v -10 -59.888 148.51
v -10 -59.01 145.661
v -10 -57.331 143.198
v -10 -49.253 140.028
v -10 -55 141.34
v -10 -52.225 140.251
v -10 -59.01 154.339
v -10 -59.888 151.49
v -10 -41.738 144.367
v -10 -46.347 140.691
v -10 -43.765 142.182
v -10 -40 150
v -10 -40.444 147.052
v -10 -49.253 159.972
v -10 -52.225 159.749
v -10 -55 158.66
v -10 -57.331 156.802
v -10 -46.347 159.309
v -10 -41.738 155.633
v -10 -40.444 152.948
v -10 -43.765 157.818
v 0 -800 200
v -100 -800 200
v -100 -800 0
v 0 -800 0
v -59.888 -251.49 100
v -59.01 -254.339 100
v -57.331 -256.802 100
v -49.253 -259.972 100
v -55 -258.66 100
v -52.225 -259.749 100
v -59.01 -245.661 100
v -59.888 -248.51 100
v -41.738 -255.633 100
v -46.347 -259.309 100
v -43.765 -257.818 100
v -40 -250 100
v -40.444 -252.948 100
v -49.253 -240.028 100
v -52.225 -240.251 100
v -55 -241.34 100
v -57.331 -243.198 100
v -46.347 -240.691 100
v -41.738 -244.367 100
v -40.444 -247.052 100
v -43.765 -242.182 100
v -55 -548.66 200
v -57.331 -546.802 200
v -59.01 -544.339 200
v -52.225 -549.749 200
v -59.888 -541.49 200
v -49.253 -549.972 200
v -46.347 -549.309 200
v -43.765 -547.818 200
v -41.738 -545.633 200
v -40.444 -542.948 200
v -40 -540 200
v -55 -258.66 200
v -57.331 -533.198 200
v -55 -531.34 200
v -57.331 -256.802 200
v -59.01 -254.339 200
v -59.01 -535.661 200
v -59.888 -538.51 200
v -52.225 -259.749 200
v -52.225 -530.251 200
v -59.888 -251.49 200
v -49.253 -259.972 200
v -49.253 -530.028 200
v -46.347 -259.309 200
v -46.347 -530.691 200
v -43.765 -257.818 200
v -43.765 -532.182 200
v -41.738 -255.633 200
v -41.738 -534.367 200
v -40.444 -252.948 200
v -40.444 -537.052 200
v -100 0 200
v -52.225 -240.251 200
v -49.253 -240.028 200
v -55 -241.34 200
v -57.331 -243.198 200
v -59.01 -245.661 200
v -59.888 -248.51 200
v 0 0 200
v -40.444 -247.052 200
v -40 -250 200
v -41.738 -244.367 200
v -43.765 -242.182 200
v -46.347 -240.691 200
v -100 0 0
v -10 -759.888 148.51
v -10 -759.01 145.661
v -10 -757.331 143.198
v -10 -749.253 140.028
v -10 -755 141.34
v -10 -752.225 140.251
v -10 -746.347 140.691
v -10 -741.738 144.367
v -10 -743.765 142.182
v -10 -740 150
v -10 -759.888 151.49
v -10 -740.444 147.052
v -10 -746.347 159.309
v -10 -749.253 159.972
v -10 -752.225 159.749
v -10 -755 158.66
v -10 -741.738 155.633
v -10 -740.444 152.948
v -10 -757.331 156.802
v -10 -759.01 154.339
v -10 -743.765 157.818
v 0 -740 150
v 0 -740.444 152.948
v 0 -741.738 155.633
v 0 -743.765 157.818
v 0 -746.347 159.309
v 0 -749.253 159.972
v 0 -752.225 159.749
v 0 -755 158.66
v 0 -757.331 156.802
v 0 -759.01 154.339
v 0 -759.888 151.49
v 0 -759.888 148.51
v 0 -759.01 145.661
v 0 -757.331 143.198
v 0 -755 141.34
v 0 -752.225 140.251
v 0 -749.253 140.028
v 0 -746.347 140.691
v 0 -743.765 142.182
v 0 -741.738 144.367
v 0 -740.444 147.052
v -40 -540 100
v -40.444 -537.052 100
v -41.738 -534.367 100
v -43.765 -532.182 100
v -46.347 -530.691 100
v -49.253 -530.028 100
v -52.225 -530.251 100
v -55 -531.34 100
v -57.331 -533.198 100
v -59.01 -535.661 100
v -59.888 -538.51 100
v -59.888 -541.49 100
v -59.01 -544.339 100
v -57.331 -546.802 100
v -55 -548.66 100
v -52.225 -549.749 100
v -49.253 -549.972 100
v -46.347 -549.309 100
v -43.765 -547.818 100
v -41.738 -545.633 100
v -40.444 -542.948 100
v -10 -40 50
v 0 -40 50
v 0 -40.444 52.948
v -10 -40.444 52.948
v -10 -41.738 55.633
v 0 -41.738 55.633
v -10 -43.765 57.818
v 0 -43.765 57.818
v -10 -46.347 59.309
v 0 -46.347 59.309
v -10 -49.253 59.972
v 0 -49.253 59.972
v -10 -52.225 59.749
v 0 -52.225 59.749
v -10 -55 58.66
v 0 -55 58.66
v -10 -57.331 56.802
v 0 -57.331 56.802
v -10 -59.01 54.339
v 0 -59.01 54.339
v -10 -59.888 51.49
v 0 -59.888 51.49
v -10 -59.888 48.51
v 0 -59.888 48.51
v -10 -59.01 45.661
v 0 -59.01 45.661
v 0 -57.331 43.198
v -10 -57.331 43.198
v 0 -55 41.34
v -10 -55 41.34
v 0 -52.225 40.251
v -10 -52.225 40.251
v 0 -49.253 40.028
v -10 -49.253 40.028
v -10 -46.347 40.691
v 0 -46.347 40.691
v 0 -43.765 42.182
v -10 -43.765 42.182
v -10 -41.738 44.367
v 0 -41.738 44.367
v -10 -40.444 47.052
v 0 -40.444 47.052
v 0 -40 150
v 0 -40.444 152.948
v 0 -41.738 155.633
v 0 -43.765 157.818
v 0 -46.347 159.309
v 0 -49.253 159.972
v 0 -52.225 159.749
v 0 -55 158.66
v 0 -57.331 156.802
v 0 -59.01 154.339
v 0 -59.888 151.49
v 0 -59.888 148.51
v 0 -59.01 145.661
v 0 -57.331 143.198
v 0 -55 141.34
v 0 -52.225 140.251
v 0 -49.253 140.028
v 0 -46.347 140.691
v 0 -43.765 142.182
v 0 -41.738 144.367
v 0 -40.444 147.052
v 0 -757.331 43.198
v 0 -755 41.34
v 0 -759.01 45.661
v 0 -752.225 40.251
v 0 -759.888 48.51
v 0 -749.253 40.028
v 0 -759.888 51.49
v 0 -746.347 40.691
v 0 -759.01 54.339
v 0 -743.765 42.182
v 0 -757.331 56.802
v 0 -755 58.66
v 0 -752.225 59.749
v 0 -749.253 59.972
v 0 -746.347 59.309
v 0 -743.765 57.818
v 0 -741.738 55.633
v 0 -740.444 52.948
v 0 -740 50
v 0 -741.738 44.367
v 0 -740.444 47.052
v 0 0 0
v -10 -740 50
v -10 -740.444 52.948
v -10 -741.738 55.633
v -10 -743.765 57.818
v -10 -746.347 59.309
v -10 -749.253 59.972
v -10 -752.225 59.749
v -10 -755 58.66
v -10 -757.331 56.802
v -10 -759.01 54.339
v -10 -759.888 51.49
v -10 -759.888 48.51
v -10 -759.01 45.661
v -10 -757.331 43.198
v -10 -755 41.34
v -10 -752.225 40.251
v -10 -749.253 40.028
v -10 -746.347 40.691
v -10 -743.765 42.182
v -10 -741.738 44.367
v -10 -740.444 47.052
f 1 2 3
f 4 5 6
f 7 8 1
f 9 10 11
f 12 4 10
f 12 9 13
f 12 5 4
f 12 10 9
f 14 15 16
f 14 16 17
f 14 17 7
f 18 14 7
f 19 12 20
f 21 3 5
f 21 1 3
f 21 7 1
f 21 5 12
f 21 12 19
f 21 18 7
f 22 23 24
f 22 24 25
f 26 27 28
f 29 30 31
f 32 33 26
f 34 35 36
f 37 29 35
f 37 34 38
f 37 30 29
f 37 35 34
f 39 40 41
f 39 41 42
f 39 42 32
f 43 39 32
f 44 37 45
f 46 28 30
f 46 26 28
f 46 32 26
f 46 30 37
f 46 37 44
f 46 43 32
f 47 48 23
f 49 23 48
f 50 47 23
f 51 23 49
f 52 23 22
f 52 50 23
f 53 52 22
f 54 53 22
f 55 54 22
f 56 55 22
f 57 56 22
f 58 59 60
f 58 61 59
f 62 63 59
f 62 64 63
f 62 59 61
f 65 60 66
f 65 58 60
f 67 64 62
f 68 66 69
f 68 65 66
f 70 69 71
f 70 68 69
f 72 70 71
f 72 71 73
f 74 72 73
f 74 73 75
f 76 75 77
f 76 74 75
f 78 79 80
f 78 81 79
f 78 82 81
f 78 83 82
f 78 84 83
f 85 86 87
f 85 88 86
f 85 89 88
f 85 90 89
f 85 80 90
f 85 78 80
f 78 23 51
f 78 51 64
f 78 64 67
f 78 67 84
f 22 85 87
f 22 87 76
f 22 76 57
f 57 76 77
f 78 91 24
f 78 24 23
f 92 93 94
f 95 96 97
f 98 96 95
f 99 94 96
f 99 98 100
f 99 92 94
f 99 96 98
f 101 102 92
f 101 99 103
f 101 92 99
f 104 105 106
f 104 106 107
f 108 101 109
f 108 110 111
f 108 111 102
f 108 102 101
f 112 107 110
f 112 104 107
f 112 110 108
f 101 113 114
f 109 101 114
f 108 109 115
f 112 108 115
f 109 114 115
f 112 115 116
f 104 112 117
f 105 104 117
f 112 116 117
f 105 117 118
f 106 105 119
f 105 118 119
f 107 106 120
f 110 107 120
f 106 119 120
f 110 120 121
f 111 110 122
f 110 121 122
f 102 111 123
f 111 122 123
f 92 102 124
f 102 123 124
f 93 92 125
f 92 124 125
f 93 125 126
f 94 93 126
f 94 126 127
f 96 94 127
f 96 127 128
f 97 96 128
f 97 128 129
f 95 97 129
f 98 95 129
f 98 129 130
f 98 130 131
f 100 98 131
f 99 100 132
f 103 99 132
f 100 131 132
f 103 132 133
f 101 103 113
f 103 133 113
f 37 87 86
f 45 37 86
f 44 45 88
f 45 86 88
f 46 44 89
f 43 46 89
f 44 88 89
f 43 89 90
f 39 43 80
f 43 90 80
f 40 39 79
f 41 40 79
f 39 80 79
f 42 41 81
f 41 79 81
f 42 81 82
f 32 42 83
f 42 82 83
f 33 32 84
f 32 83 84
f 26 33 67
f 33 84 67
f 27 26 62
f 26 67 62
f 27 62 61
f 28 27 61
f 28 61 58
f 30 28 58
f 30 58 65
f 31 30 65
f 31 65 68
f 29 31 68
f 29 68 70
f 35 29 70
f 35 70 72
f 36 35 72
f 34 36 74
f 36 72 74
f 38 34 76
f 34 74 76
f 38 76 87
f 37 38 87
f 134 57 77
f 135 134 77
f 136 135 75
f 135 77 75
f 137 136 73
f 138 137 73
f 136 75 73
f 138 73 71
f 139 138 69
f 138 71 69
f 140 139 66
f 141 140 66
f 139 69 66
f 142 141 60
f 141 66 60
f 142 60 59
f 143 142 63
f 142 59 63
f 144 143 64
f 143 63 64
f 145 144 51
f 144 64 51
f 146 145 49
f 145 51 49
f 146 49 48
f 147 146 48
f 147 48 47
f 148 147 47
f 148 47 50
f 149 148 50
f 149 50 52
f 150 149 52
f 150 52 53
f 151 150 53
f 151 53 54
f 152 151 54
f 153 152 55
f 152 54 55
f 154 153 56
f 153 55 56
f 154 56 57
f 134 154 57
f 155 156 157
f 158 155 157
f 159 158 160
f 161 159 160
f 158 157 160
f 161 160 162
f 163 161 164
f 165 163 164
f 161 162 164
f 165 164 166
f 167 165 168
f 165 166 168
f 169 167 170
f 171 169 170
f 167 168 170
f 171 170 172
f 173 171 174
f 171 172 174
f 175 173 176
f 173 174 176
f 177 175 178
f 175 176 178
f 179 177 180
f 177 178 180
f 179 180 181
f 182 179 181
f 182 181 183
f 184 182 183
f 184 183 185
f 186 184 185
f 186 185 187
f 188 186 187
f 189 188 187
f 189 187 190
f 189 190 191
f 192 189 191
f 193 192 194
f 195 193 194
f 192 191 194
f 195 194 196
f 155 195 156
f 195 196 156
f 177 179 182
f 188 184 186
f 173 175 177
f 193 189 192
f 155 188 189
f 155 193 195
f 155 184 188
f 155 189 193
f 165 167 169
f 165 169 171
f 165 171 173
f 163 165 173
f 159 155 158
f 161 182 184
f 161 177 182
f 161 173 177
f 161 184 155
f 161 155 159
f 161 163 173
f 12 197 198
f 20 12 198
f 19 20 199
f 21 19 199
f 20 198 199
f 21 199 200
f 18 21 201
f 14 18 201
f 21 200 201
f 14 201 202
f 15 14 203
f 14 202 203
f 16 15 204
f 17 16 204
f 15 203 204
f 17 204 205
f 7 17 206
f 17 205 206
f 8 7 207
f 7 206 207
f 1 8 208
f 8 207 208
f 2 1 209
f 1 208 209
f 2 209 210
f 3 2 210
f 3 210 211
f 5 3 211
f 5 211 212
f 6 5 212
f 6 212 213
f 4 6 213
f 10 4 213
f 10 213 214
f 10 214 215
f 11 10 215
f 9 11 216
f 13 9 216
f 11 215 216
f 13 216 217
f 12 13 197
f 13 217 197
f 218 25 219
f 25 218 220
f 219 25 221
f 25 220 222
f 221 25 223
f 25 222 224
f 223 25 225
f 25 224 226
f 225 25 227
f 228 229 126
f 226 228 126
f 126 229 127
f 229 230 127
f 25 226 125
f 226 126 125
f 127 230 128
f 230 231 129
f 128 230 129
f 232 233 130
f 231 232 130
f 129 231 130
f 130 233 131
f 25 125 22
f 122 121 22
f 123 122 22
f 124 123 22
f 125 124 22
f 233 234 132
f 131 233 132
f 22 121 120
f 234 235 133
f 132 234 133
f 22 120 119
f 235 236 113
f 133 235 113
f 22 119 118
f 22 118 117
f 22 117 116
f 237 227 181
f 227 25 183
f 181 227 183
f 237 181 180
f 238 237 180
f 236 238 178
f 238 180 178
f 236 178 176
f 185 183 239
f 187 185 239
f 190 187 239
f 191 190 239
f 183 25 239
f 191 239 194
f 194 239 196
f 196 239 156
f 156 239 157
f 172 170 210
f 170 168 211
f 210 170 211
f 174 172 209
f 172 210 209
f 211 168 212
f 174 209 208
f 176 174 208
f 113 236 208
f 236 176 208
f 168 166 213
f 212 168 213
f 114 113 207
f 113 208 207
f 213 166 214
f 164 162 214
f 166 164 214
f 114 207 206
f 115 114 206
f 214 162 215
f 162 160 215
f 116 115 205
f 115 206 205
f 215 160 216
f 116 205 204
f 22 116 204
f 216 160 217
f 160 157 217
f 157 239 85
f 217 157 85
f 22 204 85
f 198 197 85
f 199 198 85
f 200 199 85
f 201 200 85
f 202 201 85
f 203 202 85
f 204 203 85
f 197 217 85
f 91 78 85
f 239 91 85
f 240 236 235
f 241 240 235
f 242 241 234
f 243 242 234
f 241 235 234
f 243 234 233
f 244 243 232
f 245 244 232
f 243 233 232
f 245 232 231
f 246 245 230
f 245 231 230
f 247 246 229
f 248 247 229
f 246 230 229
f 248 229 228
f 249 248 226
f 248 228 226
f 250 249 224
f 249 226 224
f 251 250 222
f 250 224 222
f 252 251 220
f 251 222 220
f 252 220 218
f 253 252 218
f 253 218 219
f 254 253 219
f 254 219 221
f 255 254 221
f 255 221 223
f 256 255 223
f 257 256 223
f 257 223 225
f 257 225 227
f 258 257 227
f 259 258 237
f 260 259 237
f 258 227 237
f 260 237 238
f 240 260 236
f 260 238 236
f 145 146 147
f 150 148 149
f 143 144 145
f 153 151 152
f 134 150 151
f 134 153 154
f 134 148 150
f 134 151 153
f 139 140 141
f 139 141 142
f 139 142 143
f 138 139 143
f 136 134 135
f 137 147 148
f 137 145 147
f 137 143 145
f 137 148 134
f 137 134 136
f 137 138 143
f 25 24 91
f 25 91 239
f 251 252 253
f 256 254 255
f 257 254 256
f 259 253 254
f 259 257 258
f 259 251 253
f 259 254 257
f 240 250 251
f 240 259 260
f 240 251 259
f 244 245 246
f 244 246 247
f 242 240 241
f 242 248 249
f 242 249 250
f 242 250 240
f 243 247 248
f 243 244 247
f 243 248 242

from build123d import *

# Parameters (mm, degrees)
F0_W     = 100
F0_H     = 200
F1_DEPTH = 800
F2_R     = 10
F3_DEPTH = 10
F4_R     = 10
F5_DEPTH = 100


with BuildPart() as f1:
    # F0 (on Front) → F1 (new body)
    with BuildSketch(Plane.XZ):
        with Locations((-50, 100)):
            Rectangle(F0_W, F0_H)
    extrude(amount=F1_DEPTH)

    # F2 (on face) → F3 (cut)
    with BuildSketch(Plane.YZ):
        with Locations((-750, 150)):
            Circle(F2_R)
        with Locations((-750, 50)):
            Circle(F2_R)
        with Locations((-50, 150)):
            Circle(F2_R)
        with Locations((-50, 50)):
            Circle(F2_R)
    extrude(amount=-F3_DEPTH, mode=Mode.SUBTRACT)

    # F4 (on face) → F5 (cut)
    with BuildSketch(Plane.XY.offset(200)):
        with Locations((-50, -250)):
            Circle(F4_R)
        with Locations((-50, -540)):
            Circle(F4_R)
    extrude(amount=-F5_DEPTH, mode=Mode.SUBTRACT)


solid = f1.part
